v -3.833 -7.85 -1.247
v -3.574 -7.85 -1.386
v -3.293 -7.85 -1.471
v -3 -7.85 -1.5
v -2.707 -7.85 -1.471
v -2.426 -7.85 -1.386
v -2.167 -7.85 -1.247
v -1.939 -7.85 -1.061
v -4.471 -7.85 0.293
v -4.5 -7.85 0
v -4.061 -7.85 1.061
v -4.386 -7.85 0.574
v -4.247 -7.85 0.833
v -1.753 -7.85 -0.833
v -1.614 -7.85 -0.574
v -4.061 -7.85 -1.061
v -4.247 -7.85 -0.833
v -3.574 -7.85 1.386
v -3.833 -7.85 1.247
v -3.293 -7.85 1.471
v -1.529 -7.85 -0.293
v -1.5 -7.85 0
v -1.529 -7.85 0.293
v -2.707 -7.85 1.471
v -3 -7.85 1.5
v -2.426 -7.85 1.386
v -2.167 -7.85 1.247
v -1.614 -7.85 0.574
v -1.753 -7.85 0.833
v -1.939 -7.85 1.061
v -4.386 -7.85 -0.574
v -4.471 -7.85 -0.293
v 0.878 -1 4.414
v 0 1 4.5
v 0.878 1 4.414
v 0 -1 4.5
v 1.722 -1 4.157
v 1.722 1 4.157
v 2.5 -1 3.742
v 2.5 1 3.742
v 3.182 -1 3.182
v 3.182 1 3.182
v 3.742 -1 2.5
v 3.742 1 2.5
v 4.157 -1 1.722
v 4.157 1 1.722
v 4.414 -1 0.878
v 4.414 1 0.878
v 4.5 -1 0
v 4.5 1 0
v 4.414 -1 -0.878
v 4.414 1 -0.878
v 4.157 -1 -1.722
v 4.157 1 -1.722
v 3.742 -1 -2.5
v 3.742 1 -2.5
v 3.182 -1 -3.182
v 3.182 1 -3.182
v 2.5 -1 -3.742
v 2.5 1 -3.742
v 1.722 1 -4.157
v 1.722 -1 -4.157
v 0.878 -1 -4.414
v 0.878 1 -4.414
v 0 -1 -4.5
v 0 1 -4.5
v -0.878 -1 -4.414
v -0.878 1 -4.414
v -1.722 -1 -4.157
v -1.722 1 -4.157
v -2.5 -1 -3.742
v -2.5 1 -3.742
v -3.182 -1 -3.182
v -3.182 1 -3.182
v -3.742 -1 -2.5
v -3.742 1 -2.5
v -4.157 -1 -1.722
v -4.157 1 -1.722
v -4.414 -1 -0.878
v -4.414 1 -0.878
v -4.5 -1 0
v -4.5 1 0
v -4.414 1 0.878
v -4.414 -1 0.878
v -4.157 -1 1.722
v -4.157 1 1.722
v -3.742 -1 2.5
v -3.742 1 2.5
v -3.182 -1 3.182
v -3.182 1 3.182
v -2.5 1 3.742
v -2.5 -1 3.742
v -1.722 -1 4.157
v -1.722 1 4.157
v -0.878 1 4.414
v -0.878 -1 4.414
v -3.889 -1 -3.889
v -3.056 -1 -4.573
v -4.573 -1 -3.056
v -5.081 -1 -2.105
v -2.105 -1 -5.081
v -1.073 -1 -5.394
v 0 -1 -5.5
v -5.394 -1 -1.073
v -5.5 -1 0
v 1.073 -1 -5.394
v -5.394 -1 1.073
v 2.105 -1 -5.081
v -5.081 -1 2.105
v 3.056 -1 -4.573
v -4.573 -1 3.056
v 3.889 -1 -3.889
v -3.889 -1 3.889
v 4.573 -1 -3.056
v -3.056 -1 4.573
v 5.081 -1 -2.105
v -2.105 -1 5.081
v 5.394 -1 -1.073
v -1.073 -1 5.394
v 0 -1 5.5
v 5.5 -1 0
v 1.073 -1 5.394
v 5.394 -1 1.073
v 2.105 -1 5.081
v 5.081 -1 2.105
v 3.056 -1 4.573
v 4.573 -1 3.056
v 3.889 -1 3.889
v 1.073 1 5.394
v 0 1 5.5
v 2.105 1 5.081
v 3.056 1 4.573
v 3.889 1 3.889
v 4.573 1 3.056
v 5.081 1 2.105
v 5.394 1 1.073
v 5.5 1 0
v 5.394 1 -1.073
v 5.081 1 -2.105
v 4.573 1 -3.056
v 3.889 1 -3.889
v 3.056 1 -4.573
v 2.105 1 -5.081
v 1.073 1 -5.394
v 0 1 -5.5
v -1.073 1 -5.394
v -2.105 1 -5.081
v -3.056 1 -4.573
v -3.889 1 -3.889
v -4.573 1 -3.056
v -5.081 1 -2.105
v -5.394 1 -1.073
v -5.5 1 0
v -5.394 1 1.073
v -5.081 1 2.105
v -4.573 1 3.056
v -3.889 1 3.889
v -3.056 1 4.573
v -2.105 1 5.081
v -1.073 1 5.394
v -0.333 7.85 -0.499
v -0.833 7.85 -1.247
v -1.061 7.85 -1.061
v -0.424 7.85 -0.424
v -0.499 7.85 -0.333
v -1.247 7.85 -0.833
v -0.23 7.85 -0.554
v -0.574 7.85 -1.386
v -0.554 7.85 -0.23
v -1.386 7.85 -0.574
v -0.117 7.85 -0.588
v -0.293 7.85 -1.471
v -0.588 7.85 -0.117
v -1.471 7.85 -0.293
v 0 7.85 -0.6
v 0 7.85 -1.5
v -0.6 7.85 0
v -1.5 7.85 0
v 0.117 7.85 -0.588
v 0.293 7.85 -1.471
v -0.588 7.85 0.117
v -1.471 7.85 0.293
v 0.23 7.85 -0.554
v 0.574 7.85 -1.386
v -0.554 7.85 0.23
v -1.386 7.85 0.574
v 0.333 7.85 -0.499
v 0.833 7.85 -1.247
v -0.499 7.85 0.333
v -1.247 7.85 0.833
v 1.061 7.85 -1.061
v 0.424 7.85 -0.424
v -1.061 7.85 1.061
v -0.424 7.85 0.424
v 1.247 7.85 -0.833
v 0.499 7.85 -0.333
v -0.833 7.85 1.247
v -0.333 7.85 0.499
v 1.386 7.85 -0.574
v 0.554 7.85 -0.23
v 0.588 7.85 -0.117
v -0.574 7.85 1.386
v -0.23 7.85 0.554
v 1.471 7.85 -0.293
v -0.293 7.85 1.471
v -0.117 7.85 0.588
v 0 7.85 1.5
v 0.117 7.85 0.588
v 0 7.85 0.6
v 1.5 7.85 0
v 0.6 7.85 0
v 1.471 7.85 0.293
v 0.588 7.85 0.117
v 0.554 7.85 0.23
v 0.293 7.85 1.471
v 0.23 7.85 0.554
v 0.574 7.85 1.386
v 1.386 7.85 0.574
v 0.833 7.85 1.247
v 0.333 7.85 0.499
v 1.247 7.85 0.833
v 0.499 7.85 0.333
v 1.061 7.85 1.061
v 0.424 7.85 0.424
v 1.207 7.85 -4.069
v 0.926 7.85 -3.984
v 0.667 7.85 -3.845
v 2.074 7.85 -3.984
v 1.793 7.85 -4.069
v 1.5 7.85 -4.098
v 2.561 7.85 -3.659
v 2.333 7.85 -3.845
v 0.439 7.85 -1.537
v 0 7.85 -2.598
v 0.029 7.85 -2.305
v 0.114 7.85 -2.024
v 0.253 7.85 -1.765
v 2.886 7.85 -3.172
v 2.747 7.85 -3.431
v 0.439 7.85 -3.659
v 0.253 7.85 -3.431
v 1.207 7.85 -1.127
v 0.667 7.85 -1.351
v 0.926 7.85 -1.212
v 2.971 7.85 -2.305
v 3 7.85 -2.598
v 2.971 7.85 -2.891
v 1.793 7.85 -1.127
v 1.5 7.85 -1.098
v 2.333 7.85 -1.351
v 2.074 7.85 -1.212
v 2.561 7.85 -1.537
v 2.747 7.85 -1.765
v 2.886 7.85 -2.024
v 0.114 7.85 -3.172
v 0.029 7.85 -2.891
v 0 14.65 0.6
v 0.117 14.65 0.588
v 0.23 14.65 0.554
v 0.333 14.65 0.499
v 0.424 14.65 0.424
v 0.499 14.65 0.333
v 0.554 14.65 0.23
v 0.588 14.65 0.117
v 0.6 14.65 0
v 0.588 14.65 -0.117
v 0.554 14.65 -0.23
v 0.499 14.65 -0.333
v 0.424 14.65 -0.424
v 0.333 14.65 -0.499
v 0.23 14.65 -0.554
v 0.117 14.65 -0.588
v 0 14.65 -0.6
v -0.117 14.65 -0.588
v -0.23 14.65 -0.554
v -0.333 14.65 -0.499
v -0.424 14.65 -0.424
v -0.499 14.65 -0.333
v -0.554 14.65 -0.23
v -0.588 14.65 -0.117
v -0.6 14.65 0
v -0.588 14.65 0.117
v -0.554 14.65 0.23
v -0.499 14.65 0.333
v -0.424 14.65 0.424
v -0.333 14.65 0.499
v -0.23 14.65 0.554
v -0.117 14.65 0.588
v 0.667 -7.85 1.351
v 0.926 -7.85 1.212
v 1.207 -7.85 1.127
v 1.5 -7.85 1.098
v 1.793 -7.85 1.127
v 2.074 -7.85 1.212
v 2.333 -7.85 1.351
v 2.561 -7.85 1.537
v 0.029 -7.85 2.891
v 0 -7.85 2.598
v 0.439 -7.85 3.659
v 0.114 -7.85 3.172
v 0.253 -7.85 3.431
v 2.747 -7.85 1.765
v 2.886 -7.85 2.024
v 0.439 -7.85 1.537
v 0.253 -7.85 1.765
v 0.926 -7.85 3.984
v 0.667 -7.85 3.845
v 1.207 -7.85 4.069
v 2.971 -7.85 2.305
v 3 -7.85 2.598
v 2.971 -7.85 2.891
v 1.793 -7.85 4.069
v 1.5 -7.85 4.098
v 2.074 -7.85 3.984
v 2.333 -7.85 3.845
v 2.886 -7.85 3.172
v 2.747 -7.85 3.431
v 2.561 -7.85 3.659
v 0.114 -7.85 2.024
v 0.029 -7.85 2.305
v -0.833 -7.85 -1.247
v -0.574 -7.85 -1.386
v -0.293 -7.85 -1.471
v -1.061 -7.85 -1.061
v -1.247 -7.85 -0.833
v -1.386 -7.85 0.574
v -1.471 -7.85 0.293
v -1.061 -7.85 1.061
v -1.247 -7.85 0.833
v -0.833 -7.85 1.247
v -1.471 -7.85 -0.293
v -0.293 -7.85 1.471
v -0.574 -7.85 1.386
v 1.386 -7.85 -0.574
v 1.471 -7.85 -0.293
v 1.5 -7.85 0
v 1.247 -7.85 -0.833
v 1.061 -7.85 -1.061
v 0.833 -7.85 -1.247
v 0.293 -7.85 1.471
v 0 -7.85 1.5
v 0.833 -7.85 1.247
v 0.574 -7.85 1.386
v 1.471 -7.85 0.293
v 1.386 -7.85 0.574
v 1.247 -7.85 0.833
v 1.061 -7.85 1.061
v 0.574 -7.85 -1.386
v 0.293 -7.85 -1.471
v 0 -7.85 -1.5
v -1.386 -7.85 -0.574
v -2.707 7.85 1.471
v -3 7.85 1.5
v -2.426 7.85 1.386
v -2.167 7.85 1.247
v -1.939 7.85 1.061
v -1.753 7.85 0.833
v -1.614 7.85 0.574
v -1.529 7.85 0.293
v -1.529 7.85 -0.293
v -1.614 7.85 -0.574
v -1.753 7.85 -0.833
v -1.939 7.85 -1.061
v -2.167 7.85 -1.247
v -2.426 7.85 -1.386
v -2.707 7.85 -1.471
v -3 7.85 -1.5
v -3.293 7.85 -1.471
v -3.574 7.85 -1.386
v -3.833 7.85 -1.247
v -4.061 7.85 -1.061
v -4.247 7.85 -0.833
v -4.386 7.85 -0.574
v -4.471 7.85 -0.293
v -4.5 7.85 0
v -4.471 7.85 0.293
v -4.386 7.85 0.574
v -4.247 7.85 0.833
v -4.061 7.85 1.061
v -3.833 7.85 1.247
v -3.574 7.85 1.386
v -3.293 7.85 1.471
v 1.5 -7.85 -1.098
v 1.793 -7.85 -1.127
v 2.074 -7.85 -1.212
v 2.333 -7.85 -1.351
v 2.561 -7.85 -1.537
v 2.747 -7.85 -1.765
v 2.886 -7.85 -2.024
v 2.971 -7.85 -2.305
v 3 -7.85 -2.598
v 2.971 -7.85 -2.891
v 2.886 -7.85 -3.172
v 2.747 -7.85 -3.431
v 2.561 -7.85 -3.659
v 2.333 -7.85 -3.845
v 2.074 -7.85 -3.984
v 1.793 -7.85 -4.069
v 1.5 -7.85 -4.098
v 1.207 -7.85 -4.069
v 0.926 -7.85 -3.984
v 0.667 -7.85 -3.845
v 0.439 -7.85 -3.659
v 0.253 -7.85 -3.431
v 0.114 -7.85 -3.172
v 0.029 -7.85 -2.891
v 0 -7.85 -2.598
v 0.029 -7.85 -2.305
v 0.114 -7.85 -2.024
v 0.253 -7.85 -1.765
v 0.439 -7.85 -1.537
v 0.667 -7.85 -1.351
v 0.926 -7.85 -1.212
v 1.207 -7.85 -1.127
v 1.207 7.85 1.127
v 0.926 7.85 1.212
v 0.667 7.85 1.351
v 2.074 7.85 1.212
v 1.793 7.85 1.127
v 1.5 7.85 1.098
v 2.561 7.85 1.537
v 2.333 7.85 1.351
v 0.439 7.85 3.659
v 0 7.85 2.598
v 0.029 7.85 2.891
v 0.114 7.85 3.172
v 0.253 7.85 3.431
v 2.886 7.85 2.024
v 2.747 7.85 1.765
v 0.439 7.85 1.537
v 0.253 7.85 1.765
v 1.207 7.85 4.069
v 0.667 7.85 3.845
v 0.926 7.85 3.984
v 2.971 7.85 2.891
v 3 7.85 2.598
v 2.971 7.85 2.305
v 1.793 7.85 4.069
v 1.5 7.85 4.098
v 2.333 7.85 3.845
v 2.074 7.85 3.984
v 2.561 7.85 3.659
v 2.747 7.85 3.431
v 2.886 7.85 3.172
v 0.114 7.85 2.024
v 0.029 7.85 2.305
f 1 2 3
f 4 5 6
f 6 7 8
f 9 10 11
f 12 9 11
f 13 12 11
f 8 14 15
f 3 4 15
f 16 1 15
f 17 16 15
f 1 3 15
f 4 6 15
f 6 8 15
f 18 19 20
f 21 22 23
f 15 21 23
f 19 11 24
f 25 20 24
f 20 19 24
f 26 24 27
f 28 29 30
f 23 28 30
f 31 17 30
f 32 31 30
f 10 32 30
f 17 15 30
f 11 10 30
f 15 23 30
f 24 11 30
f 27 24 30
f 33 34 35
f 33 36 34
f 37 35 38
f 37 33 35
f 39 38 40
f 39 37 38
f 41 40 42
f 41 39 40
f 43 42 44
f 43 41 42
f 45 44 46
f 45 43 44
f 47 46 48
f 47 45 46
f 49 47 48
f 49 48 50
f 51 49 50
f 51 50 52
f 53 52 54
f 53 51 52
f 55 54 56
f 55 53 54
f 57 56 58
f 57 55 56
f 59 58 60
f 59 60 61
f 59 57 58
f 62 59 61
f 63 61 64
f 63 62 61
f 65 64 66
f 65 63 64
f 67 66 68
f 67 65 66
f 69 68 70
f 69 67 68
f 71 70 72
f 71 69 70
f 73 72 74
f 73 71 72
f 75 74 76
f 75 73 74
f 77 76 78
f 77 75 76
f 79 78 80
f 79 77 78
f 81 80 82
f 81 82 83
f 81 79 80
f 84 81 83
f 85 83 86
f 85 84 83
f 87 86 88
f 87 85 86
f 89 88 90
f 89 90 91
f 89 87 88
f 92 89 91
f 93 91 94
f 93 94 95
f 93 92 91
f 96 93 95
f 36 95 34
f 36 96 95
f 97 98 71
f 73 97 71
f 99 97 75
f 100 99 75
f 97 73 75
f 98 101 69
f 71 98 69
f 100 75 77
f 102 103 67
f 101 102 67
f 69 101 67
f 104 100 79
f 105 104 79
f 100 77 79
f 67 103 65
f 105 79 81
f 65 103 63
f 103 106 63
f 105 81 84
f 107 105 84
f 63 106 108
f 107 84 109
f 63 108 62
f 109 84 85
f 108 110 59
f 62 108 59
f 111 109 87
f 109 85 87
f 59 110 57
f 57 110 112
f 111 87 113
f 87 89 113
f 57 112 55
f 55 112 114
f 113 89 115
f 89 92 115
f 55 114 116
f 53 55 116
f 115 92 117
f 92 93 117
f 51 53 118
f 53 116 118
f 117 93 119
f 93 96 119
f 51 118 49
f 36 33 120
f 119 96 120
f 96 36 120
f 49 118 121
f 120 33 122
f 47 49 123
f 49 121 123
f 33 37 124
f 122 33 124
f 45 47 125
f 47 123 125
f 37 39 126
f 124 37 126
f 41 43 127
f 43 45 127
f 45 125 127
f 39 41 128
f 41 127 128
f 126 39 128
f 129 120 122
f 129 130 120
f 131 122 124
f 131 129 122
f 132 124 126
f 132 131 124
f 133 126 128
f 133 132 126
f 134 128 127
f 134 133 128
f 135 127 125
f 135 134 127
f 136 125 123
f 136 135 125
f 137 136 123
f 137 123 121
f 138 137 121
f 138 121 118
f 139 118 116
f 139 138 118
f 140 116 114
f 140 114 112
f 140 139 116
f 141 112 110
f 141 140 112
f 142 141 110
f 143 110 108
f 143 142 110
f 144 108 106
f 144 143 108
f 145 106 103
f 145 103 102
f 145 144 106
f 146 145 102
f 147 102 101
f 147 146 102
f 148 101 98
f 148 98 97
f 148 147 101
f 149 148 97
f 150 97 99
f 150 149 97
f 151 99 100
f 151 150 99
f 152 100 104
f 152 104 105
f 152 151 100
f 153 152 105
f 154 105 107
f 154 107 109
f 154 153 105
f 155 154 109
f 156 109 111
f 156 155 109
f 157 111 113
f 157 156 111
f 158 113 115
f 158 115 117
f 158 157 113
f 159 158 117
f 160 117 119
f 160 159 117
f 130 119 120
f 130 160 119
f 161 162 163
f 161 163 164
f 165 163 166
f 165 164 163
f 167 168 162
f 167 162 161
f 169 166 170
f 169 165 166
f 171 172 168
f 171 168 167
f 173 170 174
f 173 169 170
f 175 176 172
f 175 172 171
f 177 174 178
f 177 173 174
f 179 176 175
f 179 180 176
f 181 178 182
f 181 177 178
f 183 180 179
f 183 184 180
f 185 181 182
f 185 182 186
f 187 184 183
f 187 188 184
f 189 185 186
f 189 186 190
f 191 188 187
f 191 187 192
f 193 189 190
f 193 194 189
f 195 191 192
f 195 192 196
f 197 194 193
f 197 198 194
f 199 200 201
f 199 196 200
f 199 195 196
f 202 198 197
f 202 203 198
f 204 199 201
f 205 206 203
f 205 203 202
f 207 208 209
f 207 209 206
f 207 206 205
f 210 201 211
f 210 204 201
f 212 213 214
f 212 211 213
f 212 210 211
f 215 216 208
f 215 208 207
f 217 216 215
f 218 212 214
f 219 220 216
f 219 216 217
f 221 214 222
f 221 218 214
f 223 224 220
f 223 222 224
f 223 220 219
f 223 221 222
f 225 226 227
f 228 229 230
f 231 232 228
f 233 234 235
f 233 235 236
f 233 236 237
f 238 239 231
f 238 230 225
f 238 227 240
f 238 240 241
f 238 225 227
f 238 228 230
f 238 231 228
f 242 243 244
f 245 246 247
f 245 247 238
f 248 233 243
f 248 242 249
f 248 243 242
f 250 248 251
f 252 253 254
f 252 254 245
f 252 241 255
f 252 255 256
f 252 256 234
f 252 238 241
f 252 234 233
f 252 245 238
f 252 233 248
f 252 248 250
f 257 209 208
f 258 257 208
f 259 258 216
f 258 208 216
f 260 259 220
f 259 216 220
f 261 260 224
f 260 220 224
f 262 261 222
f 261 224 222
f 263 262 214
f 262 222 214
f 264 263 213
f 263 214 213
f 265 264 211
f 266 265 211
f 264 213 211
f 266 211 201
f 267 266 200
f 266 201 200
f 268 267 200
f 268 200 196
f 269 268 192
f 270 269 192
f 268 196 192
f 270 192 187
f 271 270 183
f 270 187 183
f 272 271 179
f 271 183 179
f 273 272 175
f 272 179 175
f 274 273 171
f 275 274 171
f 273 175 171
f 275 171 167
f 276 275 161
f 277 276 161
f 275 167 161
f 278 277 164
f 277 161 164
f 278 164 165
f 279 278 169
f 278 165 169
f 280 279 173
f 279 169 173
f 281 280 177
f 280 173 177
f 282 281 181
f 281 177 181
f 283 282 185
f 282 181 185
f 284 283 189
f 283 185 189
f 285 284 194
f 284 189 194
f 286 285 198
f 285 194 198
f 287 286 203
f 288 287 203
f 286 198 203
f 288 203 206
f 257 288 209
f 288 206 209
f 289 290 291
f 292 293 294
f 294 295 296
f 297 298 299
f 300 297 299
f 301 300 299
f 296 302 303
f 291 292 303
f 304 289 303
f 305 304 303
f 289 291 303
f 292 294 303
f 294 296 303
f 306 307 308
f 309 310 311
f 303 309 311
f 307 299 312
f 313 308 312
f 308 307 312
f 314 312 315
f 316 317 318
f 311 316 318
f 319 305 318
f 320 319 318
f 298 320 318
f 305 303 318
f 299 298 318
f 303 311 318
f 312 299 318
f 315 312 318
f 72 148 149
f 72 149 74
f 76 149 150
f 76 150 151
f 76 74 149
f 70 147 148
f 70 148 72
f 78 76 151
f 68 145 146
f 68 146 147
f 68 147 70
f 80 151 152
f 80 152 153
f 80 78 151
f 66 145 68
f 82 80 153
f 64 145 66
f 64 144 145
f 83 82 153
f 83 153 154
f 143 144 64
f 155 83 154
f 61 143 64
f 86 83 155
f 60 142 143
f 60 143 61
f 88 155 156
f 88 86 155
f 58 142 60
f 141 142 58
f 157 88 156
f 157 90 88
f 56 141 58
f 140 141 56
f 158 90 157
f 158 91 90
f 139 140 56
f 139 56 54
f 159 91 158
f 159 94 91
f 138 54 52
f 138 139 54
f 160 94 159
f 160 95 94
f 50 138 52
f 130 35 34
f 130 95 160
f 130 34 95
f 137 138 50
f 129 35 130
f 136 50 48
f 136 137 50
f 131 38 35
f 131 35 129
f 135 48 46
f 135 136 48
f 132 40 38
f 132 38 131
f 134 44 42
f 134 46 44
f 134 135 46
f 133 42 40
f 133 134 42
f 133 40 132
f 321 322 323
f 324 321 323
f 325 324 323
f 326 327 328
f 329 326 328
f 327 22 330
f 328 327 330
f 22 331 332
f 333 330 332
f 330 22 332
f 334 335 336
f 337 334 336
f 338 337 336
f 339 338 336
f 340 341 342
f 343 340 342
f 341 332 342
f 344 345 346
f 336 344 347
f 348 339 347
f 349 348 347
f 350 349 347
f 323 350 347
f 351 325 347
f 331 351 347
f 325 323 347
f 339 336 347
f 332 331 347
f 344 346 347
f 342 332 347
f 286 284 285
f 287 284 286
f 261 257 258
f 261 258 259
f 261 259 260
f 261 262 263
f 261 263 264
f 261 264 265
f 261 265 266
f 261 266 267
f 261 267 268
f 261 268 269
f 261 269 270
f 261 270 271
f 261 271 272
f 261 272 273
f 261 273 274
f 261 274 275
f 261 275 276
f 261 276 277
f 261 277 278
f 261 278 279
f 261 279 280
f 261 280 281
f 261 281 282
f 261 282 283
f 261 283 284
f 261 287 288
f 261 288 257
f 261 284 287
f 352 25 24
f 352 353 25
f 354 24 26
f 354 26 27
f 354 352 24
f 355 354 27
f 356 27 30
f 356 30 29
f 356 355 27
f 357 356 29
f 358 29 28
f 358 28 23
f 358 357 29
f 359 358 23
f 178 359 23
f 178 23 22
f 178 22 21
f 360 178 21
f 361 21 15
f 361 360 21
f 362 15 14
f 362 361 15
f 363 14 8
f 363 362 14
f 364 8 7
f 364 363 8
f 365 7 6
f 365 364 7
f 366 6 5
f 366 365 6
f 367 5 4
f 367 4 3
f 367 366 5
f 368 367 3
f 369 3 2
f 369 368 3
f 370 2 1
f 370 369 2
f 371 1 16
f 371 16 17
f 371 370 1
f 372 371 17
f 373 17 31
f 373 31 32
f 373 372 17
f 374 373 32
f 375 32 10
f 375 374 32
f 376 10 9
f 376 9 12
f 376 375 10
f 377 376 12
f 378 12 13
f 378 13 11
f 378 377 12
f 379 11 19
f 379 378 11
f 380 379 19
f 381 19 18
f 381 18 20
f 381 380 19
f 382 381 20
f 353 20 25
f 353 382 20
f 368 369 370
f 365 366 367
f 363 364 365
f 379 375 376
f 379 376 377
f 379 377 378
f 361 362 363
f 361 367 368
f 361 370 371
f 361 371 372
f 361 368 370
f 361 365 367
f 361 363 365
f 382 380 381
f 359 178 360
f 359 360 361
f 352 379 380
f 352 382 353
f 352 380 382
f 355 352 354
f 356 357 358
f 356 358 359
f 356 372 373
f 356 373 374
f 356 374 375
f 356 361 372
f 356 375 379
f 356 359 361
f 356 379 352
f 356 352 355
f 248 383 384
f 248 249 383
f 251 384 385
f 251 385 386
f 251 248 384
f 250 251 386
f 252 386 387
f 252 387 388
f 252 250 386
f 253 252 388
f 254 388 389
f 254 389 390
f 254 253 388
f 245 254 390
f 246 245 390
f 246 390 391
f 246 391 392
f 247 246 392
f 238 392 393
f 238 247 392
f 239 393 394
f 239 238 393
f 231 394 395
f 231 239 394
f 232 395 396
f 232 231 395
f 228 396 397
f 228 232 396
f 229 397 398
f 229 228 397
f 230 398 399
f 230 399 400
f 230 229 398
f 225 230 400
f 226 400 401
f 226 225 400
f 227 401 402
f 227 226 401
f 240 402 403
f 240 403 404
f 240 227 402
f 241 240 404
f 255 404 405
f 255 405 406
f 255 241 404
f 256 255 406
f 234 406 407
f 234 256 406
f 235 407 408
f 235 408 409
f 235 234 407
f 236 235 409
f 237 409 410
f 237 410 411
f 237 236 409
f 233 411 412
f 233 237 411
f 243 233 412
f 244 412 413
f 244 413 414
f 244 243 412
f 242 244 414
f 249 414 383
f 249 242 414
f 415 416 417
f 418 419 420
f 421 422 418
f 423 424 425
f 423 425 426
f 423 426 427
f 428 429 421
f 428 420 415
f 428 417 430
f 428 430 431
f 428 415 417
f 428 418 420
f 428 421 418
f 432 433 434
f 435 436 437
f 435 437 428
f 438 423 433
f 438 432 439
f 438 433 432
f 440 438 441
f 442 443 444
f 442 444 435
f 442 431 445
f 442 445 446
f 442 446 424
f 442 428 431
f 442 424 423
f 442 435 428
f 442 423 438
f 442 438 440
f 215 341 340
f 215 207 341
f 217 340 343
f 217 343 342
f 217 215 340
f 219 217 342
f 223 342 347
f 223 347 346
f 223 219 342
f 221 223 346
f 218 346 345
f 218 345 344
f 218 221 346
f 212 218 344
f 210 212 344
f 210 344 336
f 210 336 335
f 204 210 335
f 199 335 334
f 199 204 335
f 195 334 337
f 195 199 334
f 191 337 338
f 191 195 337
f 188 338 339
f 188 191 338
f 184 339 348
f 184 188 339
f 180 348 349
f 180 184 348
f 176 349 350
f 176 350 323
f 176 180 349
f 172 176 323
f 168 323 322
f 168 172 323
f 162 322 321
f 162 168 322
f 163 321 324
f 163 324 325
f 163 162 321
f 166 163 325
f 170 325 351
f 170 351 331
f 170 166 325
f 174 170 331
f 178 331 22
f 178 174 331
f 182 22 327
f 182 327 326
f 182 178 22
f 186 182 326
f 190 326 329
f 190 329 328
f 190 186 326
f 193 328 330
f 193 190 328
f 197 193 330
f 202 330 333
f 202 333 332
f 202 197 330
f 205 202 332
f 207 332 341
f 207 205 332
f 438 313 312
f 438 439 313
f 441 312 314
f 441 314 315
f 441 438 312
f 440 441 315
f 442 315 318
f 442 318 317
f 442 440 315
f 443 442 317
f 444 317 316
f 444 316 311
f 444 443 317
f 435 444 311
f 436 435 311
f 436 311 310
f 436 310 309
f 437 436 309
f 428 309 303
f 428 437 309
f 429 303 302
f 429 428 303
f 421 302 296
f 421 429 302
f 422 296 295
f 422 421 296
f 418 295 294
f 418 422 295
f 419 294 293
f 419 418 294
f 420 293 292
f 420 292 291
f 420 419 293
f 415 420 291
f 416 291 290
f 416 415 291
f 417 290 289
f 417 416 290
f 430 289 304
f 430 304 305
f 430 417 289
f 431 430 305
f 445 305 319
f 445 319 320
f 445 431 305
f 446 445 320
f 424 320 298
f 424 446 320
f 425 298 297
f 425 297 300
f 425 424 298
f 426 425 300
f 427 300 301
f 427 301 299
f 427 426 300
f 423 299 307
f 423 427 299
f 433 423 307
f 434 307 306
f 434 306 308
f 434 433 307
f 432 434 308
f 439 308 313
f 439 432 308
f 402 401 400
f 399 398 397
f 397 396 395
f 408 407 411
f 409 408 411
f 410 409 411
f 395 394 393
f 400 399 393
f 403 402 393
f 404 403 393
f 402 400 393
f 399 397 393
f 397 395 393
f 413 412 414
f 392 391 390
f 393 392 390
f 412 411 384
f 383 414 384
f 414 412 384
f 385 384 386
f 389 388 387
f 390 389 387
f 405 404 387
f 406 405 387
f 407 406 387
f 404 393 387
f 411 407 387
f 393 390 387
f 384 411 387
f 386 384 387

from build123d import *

# Parameters (mm, degrees)
SKETCH1_R             = 1.5
BOSS_EXTRUDE1_DEPTH   = 7.85
BOSS_EXTRUDE1_2_DEPTH = 7.85
BOSS_EXTRUDE1_3_DEPTH = 7.85
BOSS_EXTRUDE1_4_DEPTH = 7.85
SKETCH3_R             = 5.5
SKETCH3_R_2           = 4.5
BOSS_EXTRUDE2_DEPTH   = 1
SKETCH4_R             = 0.6
BOSS_EXTRUDE3_DEPTH   = 6.8


with BuildPart() as part:
    # Sketch1 → Boss-Extrude1 (new, symmetric)
    with BuildSketch(Plane(origin=(0, 0, 0), x_dir=(1, 0, 0), z_dir=(0, 1, 0))):
        with Locations(Location((-3, 0, 0), (0, 0, 270))):
            Circle(SKETCH1_R)
    extrude(amount=BOSS_EXTRUDE1_DEPTH, both=True)


with BuildPart() as body_2:
    # Sketch1 → Boss-Extrude1 2 (new, symmetric)
    with BuildSketch(Plane(origin=(0, 0, 0), x_dir=(1, 0, 0), z_dir=(0, 1, 0))):
        with Locations(Location((0, 0, 0), (0, 0, 270))):
            Circle(SKETCH1_R)
    extrude(amount=BOSS_EXTRUDE1_2_DEPTH, both=True)

    # Sketch4 → Boss-Extrude3 (add)
    with BuildSketch(Plane(origin=(0, 7.85, 0), x_dir=(1, 0, 0), z_dir=(0, 1, 0))):
        with Locations(Location((0, 0, 0), (0, 0, 270))):
            Circle(SKETCH4_R)
    extrude(amount=BOSS_EXTRUDE3_DEPTH)


with BuildPart() as body_3:
    # Sketch1 → Boss-Extrude1 3 (new, symmetric)
    with BuildSketch(Plane(origin=(0, 0, 0), x_dir=(1, 0, 0), z_dir=(0, 1, 0))):
        with Locations(Location((1.5, 2.598076211, 0), (0, 0, 270))):
            Circle(SKETCH1_R)
    extrude(amount=BOSS_EXTRUDE1_3_DEPTH, both=True)


with BuildPart() as body_4:
    # Sketch1 → Boss-Extrude1 4 (new, symmetric)
    with BuildSketch(Plane(origin=(0, 0, 0), x_dir=(1, 0, 0), z_dir=(0, 1, 0))):
        with Locations(Location((1.5, -2.598076211, 0), (0, 0, 270))):
            Circle(SKETCH1_R)
    extrude(amount=BOSS_EXTRUDE1_4_DEPTH, both=True)


with BuildPart() as body_5:
    # Sketch3 → Boss-Extrude2 (new, symmetric)
    with BuildSketch(Plane(origin=(0, 0, 0), x_dir=(1, 0, 0), z_dir=(0, 1, 0))):
        with Locations(Location((0, 0, 0), (0, 0, 270))):
            Circle(SKETCH3_R)
        with Locations(Location((0, 0, 0), (0, 0, 270))):
            Circle(SKETCH3_R_2, mode=Mode.SUBTRACT)
    extrude(amount=BOSS_EXTRUDE2_DEPTH, both=True)


solid = Compound([part.part, body_2.part, body_3.part, body_4.part, body_5.part])
